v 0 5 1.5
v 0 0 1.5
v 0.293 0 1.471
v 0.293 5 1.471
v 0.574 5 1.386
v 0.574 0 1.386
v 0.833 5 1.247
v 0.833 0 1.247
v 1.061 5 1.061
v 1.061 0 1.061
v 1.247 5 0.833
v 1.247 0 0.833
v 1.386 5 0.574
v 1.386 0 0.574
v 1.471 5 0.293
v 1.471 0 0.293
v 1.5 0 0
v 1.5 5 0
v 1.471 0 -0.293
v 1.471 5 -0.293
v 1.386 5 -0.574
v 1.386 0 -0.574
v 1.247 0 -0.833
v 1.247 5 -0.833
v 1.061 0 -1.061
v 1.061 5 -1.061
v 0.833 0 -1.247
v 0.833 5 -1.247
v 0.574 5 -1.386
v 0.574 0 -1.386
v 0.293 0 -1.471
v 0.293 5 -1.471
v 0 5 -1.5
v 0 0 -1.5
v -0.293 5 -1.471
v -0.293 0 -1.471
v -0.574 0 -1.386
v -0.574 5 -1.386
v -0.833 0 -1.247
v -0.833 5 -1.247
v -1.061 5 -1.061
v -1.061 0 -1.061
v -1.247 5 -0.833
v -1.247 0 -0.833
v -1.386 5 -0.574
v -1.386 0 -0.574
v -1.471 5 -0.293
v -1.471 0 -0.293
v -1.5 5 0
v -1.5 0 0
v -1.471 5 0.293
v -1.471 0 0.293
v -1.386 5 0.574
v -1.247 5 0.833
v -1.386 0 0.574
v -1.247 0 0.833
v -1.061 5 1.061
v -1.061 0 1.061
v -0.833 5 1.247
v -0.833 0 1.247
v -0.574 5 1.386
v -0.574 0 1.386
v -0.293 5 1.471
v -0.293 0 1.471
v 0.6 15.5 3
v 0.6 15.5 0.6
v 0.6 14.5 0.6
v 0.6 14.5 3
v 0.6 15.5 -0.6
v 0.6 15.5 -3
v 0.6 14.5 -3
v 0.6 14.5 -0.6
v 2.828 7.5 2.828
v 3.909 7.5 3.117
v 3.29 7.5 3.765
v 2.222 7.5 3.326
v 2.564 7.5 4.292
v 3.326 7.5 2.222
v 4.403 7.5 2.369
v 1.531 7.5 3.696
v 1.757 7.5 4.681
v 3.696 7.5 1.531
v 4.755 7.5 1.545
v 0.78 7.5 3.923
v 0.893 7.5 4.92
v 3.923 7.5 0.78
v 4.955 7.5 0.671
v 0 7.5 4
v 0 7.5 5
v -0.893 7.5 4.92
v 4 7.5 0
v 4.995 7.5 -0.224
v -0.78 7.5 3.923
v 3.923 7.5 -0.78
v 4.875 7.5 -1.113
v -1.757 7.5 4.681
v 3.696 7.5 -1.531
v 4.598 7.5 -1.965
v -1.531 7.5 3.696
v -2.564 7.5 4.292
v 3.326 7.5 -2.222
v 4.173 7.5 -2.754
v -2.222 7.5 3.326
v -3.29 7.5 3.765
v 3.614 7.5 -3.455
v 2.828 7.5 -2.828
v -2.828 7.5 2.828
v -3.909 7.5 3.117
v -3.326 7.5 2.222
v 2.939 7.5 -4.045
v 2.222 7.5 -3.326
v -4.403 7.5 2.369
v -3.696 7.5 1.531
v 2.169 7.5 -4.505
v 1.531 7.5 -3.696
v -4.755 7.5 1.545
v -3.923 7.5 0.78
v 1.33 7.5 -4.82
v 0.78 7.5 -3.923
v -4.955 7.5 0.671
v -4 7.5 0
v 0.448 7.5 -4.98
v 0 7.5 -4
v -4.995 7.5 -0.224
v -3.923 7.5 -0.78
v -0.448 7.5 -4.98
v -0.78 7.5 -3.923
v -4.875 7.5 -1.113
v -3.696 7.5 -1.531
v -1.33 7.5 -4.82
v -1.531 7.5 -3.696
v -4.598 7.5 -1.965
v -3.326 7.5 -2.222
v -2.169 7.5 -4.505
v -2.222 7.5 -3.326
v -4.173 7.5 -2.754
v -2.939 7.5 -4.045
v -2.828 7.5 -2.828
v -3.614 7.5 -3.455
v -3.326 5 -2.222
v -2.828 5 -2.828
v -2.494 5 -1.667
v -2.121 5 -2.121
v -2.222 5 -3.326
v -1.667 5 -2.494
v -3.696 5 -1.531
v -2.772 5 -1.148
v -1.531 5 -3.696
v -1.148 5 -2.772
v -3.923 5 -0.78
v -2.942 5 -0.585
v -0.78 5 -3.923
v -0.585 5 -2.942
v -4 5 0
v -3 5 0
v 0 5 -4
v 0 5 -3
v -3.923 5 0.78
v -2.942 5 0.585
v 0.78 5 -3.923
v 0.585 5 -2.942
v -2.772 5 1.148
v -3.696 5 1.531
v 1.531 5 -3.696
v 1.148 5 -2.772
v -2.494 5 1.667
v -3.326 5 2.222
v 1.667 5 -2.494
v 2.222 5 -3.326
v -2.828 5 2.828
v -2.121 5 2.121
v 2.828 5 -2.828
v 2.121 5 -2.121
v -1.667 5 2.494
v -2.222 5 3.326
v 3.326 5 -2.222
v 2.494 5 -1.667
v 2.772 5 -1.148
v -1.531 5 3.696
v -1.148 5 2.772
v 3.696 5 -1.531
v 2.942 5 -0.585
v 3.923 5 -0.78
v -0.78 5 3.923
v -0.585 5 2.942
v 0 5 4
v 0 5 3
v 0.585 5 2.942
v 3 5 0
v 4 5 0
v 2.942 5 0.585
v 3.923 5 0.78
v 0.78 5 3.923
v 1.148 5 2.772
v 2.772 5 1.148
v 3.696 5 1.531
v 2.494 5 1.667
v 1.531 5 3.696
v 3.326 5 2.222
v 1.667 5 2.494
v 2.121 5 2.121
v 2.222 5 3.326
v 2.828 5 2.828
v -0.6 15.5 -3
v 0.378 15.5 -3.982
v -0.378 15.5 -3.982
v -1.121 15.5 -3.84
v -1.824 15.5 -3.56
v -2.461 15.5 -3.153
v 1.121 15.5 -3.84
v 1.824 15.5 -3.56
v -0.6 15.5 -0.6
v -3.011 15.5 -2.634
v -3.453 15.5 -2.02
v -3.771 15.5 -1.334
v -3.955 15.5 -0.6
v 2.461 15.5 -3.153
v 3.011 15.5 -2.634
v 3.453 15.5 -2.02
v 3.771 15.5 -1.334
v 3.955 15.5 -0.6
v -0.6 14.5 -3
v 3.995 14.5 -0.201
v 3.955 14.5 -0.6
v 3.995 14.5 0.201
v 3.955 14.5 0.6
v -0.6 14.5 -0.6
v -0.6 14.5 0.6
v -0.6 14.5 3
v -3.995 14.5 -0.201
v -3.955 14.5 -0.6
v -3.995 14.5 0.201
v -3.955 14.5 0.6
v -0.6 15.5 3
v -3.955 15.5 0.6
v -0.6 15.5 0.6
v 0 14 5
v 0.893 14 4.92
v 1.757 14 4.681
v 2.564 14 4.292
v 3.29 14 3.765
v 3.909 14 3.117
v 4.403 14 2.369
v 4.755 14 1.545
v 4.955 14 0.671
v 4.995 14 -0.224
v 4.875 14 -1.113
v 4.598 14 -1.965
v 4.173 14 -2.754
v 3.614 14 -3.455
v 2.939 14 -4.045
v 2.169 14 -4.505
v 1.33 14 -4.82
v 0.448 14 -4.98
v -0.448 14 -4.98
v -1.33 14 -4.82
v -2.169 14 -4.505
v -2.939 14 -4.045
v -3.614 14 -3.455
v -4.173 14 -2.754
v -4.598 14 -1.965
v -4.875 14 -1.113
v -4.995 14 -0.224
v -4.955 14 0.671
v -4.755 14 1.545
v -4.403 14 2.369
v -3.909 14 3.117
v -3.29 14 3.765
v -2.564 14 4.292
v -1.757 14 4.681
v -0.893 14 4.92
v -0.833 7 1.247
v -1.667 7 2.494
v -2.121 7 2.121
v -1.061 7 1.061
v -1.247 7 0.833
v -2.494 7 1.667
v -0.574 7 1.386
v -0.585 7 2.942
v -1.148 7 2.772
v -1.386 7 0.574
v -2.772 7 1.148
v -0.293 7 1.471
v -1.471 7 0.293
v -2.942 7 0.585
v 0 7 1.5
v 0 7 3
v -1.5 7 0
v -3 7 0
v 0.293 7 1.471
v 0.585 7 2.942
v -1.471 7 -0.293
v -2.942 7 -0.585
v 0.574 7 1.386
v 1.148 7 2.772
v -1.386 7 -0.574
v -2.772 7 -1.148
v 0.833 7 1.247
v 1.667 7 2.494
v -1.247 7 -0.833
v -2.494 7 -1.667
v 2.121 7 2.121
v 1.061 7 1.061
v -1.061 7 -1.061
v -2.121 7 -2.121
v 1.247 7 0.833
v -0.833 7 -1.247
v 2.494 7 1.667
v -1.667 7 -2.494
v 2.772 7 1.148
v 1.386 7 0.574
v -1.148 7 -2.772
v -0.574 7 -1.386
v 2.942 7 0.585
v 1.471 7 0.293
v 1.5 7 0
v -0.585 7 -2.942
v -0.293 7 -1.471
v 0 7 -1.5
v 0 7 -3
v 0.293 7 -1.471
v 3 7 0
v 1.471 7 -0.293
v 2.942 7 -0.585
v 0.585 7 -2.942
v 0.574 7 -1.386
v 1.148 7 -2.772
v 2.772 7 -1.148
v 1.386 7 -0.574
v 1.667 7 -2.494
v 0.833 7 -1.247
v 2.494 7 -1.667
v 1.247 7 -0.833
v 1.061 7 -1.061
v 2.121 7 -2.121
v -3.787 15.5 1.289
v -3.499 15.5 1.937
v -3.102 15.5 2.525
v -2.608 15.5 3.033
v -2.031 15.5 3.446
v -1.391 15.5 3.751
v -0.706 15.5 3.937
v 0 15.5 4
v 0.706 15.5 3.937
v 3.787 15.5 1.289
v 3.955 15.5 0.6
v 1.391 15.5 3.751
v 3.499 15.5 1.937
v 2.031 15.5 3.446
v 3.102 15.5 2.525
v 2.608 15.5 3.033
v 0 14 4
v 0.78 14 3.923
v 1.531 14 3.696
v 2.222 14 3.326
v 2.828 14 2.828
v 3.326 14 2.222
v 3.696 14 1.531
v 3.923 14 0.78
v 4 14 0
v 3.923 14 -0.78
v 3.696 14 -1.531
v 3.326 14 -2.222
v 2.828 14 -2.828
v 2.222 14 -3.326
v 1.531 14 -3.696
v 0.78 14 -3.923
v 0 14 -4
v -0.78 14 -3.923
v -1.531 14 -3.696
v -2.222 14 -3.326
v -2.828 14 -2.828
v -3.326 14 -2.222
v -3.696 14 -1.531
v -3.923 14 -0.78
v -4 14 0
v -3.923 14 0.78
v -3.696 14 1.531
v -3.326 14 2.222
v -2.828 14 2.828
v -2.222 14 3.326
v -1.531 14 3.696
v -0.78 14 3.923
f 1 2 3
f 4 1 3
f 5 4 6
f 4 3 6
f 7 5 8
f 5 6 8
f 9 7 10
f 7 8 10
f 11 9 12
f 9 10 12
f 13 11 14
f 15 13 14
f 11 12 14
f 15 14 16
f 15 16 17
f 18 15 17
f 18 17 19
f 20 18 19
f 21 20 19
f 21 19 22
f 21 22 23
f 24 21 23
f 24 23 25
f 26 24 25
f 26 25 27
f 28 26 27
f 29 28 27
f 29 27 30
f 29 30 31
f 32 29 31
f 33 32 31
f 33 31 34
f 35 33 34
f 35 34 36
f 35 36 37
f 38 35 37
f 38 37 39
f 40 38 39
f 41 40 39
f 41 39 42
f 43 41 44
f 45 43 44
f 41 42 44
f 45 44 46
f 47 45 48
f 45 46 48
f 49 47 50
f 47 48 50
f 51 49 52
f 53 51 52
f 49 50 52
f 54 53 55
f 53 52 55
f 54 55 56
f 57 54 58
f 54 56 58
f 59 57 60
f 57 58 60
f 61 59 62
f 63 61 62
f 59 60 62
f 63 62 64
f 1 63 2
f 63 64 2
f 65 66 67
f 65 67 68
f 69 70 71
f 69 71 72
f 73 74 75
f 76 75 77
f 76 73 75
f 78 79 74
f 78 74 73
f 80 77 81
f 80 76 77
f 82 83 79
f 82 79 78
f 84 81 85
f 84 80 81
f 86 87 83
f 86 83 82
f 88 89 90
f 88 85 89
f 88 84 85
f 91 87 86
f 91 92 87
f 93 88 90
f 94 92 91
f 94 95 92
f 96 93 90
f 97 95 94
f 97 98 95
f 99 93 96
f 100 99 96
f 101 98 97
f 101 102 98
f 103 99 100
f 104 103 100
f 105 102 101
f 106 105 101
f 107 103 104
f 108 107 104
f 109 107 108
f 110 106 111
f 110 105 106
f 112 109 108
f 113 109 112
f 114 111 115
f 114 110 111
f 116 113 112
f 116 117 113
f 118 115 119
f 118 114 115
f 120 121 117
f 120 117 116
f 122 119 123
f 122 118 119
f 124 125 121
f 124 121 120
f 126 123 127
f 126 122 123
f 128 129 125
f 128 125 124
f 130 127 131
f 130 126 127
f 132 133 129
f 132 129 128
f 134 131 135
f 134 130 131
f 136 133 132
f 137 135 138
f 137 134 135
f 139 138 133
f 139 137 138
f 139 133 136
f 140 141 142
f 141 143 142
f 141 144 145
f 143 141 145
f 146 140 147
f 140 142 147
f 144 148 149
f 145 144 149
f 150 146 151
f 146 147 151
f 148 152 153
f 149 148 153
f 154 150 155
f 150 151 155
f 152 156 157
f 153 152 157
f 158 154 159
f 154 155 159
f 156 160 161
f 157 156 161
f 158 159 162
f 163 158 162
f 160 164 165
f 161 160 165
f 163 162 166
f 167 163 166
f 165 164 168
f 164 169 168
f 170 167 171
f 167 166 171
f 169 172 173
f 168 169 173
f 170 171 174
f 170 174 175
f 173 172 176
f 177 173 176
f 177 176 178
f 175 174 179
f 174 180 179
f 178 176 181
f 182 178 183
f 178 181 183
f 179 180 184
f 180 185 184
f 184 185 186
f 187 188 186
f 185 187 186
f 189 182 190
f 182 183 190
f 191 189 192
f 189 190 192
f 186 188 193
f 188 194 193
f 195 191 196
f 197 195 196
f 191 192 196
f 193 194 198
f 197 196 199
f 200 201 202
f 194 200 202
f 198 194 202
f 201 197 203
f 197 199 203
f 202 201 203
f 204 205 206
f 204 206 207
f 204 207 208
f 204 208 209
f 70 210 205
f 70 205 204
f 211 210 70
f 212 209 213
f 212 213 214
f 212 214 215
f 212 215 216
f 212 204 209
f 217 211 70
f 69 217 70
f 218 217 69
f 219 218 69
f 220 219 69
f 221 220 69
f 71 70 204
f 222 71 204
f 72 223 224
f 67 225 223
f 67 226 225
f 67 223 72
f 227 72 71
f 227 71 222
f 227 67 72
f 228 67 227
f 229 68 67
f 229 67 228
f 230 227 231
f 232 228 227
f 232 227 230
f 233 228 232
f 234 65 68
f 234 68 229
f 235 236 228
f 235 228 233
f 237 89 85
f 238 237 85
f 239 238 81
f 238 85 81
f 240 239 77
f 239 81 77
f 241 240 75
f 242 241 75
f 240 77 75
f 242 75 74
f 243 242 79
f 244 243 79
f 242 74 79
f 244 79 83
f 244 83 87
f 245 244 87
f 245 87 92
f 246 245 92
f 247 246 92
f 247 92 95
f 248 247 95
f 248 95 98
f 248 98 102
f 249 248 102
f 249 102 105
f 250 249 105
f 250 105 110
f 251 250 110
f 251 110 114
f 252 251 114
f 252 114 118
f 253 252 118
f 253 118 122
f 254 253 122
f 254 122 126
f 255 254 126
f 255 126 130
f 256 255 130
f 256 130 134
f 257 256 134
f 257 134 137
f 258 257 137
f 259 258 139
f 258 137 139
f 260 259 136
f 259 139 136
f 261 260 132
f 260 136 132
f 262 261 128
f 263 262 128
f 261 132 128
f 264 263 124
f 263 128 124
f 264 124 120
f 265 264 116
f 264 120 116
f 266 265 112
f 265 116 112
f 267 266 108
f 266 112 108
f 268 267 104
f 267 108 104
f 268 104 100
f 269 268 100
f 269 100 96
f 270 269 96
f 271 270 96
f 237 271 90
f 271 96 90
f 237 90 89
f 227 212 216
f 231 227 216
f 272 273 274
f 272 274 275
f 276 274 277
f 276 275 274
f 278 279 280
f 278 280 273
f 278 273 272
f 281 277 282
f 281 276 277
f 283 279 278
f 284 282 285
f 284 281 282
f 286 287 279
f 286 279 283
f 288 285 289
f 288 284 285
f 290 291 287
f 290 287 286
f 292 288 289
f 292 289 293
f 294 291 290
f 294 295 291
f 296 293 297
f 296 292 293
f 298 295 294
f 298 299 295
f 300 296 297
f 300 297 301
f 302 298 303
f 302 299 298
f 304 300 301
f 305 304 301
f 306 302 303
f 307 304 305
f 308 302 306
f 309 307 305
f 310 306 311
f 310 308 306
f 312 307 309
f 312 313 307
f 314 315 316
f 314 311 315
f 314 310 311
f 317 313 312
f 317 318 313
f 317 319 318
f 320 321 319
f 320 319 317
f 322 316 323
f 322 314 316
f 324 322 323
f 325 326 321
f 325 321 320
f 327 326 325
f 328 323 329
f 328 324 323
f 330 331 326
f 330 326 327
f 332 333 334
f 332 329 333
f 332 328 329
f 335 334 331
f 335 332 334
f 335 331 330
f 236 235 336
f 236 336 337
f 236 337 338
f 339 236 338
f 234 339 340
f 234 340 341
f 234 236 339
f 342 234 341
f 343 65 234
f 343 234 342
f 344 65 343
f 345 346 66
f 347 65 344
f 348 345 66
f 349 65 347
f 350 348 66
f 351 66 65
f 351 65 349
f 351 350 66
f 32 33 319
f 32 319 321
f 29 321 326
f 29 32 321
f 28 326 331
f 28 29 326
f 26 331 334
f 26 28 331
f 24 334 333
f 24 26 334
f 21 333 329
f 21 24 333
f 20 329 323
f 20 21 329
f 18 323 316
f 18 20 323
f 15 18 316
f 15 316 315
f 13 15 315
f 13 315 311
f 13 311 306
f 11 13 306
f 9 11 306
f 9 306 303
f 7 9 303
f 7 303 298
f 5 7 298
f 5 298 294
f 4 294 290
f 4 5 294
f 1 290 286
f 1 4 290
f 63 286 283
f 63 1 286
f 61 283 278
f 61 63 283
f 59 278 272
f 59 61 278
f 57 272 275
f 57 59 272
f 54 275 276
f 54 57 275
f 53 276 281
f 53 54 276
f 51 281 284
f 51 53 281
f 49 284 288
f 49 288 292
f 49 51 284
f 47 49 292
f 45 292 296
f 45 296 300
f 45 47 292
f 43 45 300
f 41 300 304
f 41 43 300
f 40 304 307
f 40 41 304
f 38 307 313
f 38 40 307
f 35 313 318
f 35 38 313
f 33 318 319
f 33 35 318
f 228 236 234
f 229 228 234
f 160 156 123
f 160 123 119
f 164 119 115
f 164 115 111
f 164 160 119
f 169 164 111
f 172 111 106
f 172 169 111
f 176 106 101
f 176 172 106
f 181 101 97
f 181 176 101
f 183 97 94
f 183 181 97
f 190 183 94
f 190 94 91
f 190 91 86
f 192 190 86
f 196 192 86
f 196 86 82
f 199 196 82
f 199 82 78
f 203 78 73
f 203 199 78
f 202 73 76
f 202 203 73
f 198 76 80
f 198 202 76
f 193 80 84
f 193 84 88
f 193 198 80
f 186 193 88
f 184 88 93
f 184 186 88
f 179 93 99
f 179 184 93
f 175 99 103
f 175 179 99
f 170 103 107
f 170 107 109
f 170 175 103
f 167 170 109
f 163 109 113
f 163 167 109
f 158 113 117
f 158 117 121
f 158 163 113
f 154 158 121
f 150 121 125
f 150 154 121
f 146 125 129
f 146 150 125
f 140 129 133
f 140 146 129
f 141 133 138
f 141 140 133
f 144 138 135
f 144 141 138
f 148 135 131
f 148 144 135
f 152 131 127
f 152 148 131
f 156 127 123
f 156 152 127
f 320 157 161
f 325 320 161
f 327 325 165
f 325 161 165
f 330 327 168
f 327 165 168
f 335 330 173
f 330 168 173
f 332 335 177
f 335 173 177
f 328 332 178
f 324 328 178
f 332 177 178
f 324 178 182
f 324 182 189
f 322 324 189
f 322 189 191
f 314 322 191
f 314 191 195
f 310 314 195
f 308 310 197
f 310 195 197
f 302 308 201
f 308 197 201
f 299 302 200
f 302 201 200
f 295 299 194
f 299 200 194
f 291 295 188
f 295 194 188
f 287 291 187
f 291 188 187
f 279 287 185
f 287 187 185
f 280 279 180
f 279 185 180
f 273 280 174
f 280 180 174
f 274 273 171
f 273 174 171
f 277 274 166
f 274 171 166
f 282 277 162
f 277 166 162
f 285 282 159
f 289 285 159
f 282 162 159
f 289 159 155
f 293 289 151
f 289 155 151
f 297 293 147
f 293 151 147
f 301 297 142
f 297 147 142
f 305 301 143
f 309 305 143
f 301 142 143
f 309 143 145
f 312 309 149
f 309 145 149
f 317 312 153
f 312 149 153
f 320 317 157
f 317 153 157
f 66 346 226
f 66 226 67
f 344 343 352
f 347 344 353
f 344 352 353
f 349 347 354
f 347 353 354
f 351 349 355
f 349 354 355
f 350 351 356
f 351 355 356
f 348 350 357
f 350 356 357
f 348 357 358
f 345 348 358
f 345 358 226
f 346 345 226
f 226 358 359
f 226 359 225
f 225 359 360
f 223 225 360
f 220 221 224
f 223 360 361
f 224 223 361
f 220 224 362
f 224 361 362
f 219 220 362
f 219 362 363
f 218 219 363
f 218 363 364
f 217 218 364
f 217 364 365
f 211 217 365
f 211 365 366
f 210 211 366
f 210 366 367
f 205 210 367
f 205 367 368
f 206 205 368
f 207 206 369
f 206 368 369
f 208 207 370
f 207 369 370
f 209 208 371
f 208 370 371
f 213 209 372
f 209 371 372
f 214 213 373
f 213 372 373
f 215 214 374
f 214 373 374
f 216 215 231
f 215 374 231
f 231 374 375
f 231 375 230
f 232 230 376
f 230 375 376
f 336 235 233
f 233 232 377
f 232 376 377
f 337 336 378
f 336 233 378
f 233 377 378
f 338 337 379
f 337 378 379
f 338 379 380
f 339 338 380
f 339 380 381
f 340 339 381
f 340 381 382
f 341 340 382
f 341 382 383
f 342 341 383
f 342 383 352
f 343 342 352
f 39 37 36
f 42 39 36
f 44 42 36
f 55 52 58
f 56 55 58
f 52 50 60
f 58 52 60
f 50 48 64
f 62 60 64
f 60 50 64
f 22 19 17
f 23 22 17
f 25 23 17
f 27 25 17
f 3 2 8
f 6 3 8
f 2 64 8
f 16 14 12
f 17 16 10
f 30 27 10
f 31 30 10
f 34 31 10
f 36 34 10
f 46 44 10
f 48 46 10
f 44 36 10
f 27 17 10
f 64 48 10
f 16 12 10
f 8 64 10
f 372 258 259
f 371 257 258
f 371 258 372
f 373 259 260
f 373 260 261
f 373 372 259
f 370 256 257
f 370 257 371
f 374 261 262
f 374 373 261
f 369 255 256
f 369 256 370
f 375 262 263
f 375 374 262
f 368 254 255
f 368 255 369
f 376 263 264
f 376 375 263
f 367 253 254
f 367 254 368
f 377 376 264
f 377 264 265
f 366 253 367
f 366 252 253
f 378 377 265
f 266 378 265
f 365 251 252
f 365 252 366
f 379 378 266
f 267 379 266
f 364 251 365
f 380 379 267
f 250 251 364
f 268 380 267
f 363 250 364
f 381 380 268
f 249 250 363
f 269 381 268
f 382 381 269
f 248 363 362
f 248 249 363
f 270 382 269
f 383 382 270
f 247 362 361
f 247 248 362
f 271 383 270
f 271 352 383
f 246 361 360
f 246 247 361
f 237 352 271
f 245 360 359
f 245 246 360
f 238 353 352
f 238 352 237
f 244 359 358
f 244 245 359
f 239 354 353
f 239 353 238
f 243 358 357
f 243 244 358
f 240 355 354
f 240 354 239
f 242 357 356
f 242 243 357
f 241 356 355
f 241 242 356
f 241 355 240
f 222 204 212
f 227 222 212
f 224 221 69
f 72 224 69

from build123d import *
from build123d.topology import SkipClean

# Parameters (mm, degrees)
SKETCH_1_R          = 1.5
EXTRUDE_1_DEPTH     = 5
SKETCH_6_R          = 5
EXTRUDE_1_2_DEPTH   = 9
SKETCH_2_R          = 4
EXTRUDE_2_DEPTH     = 1.5
SKETCH_3_W          = 8.364260008
SKETCH_3_H          = 1.2
CUT_EXTRUDE_1_DEPTH = 1
SKETCH_4_W          = 1.2
SKETCH_4_H          = 6
CUT_EXTRUDE_2_DEPTH = 1
SKETCH_7_R          = 3
SKETCH_7_R_2        = 1.5
CUT_EXTRUDE_3_DEPTH = 2
SKETCH_8_OUTSIDE_W  = 16.196
SKETCH_8_OUTSIDE_H  = 16.196
SKETCH_8_OUTSIDE_R  = 4
CUT_EXTRUDE_4_DEPTH = 2.5


with BuildPart() as part:
    # 草图1 → Extrude 1 (new body)
    with BuildSketch(Plane(origin=(0, 0, 0), x_dir=(1, 0, 0), z_dir=(0, 1, 0))):
        with Locations(Location((0, 0, 0), (0, 0, 270))):
            Circle(SKETCH_1_R)
    extrude(amount=EXTRUDE_1_DEPTH)

    # 草图6 → Extrude 1 2 (add)
    with BuildSketch(Plane(origin=(0, 5, 0), x_dir=(1, 0, 0), z_dir=(0, 1, 0))):
        with Locations(Location((0, 0, 0), (0, 0, 270))):
            Circle(SKETCH_6_R)
    extrude(amount=EXTRUDE_1_2_DEPTH)

    # 草图2 → 拉伸2 (add)
    with BuildSketch(Plane(origin=(0, 14, 0), x_dir=(-1, 0, 0), z_dir=(0, 1, 0))):
        with Locations(Location((0, 0, 0), (0, 0, 90))):
            Circle(SKETCH_2_R)
    extrude(amount=EXTRUDE_2_DEPTH)

    # 草图3 → 切除-拉伸1 (cut)
    with BuildSketch(Plane(origin=(0, 15.5, 0), x_dir=(-1, 0, 0), z_dir=(0, 1, 0))):
        Rectangle(SKETCH_3_W, SKETCH_3_H)
    extrude(amount=-CUT_EXTRUDE_1_DEPTH, mode=Mode.SUBTRACT)

    # 草图4 → 切除-拉伸2 (cut)
    with BuildSketch(Plane(origin=(0, 15.5, 0), x_dir=(-1, 0, 0), z_dir=(0, 1, 0))):
        Rectangle(SKETCH_4_W, SKETCH_4_H)
    extrude(amount=-CUT_EXTRUDE_2_DEPTH, mode=Mode.SUBTRACT)

    # 草图7 → 切除-拉伸3 (cut)
    with SkipClean():  # the faces are left unmerged after this step: merging them gives an invalid solid
        with BuildSketch(Plane.XZ.offset(-5)):
            with Locations(Location((0, 0, 0), (0, 0, 270))):
                Circle(SKETCH_7_R)
            with Locations(Location((0, 0, 0), (0, 0, 270))):
                Circle(SKETCH_7_R_2, mode=Mode.SUBTRACT)
        extrude(amount=-CUT_EXTRUDE_3_DEPTH, mode=Mode.SUBTRACT)

    # 草图8 outside → 切除-拉伸4 (cut)
    with SkipClean():  # the faces are left unmerged after this step: merging them gives an invalid solid
        with BuildSketch(Plane(origin=(0, 5, 0), x_dir=(-1, 0, 0), z_dir=(0, -1, 0))):
            Rectangle(SKETCH_8_OUTSIDE_W, SKETCH_8_OUTSIDE_H)
            with Locations(Location((0, 0, 0), (0, 0, 90))):
                Circle(SKETCH_8_OUTSIDE_R, mode=Mode.SUBTRACT)
        extrude(amount=-CUT_EXTRUDE_4_DEPTH, mode=Mode.SUBTRACT)


solid = part.part
